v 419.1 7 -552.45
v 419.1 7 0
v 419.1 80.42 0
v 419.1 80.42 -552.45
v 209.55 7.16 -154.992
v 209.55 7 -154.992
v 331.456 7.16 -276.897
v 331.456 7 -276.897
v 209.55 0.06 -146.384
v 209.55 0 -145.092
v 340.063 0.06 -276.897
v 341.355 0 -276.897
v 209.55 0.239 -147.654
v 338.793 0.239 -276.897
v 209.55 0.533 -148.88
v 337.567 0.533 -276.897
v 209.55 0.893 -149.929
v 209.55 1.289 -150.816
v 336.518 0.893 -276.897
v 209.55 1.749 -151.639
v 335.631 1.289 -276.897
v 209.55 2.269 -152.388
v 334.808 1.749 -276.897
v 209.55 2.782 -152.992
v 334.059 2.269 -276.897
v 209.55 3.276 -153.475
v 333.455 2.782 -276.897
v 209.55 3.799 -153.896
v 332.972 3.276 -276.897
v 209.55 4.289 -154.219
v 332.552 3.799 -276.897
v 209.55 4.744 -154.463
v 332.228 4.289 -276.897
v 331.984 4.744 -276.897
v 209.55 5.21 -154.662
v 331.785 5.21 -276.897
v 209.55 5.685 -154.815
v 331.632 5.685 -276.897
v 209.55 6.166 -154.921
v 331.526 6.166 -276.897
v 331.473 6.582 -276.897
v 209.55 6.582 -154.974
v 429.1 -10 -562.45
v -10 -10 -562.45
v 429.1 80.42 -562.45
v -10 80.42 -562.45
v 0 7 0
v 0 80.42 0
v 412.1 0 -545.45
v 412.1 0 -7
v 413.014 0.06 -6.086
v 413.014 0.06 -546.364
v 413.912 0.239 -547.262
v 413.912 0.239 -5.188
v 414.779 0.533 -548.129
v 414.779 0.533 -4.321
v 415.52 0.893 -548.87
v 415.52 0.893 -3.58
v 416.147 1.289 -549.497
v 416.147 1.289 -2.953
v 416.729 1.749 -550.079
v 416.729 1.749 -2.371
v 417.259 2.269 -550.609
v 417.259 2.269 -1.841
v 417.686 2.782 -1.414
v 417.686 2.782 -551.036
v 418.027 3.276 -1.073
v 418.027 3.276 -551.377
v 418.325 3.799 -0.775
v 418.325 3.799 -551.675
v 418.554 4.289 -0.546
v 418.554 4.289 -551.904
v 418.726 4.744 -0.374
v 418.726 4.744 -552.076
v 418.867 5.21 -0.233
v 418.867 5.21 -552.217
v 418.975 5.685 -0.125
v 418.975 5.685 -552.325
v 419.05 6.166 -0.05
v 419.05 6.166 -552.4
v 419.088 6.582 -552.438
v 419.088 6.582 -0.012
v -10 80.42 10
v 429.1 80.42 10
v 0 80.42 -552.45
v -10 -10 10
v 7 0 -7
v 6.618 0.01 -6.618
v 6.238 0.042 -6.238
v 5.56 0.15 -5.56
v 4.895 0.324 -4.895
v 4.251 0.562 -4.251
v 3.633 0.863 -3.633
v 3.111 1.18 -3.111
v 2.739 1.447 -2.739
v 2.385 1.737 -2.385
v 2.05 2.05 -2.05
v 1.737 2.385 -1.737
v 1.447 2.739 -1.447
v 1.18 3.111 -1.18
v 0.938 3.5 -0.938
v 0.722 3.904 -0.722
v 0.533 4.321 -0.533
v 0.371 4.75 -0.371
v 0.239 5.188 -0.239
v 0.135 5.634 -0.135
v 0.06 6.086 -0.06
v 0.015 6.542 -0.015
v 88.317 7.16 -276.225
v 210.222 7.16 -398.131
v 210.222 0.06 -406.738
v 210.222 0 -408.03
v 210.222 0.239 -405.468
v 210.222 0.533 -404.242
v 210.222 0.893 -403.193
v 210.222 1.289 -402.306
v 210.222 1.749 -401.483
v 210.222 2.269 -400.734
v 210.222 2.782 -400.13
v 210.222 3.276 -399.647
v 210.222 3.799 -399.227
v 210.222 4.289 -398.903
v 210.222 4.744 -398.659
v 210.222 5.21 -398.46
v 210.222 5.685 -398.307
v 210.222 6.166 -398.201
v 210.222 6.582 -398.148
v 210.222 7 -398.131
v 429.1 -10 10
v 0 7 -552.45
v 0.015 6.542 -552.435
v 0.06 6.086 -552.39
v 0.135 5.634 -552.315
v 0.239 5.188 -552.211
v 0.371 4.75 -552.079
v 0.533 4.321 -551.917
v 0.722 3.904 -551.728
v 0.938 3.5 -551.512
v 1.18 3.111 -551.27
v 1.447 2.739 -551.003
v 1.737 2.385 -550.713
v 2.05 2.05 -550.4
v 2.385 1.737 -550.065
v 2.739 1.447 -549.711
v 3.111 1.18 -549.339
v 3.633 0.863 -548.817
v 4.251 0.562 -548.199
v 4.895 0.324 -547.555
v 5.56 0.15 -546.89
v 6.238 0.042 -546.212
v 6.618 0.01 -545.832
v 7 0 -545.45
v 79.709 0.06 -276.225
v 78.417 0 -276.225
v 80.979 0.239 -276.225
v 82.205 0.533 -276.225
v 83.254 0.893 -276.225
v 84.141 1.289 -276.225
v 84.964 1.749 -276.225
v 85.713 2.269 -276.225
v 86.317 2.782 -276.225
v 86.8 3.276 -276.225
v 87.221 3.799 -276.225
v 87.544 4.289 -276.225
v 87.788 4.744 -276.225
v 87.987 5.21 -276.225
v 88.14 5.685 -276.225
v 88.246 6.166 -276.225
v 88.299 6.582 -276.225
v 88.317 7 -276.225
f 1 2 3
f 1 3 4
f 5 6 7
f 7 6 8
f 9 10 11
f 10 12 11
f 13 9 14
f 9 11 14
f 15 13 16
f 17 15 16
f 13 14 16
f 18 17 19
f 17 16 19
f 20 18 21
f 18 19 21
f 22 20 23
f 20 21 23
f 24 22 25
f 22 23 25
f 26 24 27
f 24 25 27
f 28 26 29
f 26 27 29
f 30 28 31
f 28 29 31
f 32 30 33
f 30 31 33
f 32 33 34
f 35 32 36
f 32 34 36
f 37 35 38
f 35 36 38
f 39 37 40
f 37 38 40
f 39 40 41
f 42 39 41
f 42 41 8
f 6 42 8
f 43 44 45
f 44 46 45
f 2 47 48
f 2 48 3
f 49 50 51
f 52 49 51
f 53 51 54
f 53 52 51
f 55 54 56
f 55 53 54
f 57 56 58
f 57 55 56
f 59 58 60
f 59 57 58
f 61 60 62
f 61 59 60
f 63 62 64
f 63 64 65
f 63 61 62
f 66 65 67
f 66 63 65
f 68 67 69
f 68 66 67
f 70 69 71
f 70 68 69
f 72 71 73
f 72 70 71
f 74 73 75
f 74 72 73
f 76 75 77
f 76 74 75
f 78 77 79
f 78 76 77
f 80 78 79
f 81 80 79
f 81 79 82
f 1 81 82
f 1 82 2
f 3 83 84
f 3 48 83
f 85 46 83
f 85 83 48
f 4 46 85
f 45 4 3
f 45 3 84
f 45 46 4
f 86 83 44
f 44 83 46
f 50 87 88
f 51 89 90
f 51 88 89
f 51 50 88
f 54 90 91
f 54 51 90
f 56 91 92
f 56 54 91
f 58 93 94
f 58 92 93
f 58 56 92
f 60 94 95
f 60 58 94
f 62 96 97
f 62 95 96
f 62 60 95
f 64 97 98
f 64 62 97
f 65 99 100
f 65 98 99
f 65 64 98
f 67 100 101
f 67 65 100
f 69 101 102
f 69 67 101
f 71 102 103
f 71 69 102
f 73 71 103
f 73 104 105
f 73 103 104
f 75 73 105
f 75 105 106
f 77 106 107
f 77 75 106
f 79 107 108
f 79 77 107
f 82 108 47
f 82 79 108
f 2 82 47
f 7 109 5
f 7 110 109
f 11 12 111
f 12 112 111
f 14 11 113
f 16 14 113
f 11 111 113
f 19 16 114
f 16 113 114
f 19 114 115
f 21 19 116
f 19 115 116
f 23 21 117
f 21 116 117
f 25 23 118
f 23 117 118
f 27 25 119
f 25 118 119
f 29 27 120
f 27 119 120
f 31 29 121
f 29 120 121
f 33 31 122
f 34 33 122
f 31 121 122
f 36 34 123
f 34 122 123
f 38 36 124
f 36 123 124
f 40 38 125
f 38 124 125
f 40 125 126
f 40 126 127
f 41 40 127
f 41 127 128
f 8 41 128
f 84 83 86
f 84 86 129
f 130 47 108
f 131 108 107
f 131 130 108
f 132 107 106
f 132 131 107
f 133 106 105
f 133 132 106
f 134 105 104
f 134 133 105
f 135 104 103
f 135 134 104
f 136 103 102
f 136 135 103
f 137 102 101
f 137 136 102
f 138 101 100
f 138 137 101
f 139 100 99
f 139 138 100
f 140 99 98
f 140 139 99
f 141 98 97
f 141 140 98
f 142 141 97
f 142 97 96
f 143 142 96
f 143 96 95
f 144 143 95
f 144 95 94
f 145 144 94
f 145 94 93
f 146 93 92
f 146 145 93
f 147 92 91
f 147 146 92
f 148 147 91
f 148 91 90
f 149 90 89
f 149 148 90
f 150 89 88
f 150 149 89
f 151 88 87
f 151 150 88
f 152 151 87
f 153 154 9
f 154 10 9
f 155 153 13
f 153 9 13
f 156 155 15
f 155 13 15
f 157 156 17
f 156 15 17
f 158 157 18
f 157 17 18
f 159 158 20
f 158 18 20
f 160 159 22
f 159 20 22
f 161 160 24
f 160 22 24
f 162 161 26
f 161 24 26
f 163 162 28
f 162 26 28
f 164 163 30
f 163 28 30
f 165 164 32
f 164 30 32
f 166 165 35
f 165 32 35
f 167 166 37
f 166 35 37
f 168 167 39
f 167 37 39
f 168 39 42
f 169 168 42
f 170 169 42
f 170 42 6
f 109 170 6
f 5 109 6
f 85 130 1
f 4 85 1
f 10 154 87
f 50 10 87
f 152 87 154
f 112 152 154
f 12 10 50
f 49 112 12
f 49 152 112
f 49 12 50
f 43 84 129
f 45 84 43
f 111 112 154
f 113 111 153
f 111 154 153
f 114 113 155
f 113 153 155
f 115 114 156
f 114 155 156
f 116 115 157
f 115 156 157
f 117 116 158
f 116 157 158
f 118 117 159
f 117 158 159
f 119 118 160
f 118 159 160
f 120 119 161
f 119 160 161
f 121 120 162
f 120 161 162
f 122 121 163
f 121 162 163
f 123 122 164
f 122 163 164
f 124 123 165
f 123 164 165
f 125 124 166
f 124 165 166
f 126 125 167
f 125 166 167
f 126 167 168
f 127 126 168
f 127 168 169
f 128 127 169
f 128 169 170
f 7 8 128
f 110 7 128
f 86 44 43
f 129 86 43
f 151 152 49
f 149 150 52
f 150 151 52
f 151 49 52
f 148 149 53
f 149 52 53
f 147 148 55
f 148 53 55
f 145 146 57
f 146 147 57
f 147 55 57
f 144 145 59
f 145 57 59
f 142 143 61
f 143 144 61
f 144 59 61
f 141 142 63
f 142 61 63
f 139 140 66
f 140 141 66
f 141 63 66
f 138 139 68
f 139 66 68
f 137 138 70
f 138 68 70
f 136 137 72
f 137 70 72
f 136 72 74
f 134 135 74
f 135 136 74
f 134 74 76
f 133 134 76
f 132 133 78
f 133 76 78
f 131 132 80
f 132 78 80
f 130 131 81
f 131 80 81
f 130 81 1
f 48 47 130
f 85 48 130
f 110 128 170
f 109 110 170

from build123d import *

# Parameters (mm, degrees)
SKETCH2_W           = 439.1
SKETCH2_H           = 572.45
SKETCH2_W_2         = 419.1
SKETCH2_H_2         = 552.45
BOSS_EXTRUDE1_DEPTH = 80.42
BOSS_EXTRUDE2_DEPTH = 7.16
SKETCH4_W           = 439.1
SKETCH4_H           = 572.45
BOSS_EXTRUDE3_DEPTH = 10
FILLET1_R           = 7


with BuildPart() as part:
    # Sketch2 → Boss-Extrude1 (new body)
    with BuildSketch(Plane(origin=(0, 0, 0), x_dir=(1, 0, 0), z_dir=(0, 1, 0))):
        with Locations((209.55, 276.225)):
            Rectangle(SKETCH2_W, SKETCH2_H)
        with Locations((209.55, 276.225)):
            Rectangle(SKETCH2_W_2, SKETCH2_H_2, mode=Mode.SUBTRACT)
    extrude(amount=BOSS_EXTRUDE1_DEPTH)



with BuildPart() as body_2:
    # Sketch3 → Boss-Extrude2 (new body)
    with BuildSketch(Plane(origin=(0, 0, 0), x_dir=(1, 0, 0), z_dir=(0, 1, 0))):
        Polygon((88.316542366, 276.225), (209.55, 154.991542366), (331.455559866, 276.897102232), (210.222102232, 398.130559866), align=None)
    extrude(amount=BOSS_EXTRUDE2_DEPTH)


with BuildPart() as part_1:
    add(part.part)

    add(body_2.part)  # Boss-Extrude3 merges body 2
    # Sketch4 → Boss-Extrude3 (add)
    with BuildSketch(Plane(origin=(0, 0, 0), x_dir=(1, 0, 0), z_dir=(0, 1, 0))):
        with Locations((209.55, 276.225)):
            Rectangle(SKETCH4_W, SKETCH4_H)
    extrude(amount=-BOSS_EXTRUDE3_DEPTH)

    # Fillet1
    fillet1_edges = [part_1.edges().sort_by_distance(p)[0] for p in [
        (0, 0, -276.225),
        (209.55, 0, 0),
        (419.1, 0, -276.225),
        (209.55, 0, -552.45),
        (149.269322299, 0, -337.177779933),
        (148.933271183, 0, -215.608271183),
        (270.502779933, 0, -215.944322299),
        (270.838831049, 0, -337.513831049),
    ]]
    fillet(fillet1_edges, radius=FILLET1_R)


solid = part_1.part
